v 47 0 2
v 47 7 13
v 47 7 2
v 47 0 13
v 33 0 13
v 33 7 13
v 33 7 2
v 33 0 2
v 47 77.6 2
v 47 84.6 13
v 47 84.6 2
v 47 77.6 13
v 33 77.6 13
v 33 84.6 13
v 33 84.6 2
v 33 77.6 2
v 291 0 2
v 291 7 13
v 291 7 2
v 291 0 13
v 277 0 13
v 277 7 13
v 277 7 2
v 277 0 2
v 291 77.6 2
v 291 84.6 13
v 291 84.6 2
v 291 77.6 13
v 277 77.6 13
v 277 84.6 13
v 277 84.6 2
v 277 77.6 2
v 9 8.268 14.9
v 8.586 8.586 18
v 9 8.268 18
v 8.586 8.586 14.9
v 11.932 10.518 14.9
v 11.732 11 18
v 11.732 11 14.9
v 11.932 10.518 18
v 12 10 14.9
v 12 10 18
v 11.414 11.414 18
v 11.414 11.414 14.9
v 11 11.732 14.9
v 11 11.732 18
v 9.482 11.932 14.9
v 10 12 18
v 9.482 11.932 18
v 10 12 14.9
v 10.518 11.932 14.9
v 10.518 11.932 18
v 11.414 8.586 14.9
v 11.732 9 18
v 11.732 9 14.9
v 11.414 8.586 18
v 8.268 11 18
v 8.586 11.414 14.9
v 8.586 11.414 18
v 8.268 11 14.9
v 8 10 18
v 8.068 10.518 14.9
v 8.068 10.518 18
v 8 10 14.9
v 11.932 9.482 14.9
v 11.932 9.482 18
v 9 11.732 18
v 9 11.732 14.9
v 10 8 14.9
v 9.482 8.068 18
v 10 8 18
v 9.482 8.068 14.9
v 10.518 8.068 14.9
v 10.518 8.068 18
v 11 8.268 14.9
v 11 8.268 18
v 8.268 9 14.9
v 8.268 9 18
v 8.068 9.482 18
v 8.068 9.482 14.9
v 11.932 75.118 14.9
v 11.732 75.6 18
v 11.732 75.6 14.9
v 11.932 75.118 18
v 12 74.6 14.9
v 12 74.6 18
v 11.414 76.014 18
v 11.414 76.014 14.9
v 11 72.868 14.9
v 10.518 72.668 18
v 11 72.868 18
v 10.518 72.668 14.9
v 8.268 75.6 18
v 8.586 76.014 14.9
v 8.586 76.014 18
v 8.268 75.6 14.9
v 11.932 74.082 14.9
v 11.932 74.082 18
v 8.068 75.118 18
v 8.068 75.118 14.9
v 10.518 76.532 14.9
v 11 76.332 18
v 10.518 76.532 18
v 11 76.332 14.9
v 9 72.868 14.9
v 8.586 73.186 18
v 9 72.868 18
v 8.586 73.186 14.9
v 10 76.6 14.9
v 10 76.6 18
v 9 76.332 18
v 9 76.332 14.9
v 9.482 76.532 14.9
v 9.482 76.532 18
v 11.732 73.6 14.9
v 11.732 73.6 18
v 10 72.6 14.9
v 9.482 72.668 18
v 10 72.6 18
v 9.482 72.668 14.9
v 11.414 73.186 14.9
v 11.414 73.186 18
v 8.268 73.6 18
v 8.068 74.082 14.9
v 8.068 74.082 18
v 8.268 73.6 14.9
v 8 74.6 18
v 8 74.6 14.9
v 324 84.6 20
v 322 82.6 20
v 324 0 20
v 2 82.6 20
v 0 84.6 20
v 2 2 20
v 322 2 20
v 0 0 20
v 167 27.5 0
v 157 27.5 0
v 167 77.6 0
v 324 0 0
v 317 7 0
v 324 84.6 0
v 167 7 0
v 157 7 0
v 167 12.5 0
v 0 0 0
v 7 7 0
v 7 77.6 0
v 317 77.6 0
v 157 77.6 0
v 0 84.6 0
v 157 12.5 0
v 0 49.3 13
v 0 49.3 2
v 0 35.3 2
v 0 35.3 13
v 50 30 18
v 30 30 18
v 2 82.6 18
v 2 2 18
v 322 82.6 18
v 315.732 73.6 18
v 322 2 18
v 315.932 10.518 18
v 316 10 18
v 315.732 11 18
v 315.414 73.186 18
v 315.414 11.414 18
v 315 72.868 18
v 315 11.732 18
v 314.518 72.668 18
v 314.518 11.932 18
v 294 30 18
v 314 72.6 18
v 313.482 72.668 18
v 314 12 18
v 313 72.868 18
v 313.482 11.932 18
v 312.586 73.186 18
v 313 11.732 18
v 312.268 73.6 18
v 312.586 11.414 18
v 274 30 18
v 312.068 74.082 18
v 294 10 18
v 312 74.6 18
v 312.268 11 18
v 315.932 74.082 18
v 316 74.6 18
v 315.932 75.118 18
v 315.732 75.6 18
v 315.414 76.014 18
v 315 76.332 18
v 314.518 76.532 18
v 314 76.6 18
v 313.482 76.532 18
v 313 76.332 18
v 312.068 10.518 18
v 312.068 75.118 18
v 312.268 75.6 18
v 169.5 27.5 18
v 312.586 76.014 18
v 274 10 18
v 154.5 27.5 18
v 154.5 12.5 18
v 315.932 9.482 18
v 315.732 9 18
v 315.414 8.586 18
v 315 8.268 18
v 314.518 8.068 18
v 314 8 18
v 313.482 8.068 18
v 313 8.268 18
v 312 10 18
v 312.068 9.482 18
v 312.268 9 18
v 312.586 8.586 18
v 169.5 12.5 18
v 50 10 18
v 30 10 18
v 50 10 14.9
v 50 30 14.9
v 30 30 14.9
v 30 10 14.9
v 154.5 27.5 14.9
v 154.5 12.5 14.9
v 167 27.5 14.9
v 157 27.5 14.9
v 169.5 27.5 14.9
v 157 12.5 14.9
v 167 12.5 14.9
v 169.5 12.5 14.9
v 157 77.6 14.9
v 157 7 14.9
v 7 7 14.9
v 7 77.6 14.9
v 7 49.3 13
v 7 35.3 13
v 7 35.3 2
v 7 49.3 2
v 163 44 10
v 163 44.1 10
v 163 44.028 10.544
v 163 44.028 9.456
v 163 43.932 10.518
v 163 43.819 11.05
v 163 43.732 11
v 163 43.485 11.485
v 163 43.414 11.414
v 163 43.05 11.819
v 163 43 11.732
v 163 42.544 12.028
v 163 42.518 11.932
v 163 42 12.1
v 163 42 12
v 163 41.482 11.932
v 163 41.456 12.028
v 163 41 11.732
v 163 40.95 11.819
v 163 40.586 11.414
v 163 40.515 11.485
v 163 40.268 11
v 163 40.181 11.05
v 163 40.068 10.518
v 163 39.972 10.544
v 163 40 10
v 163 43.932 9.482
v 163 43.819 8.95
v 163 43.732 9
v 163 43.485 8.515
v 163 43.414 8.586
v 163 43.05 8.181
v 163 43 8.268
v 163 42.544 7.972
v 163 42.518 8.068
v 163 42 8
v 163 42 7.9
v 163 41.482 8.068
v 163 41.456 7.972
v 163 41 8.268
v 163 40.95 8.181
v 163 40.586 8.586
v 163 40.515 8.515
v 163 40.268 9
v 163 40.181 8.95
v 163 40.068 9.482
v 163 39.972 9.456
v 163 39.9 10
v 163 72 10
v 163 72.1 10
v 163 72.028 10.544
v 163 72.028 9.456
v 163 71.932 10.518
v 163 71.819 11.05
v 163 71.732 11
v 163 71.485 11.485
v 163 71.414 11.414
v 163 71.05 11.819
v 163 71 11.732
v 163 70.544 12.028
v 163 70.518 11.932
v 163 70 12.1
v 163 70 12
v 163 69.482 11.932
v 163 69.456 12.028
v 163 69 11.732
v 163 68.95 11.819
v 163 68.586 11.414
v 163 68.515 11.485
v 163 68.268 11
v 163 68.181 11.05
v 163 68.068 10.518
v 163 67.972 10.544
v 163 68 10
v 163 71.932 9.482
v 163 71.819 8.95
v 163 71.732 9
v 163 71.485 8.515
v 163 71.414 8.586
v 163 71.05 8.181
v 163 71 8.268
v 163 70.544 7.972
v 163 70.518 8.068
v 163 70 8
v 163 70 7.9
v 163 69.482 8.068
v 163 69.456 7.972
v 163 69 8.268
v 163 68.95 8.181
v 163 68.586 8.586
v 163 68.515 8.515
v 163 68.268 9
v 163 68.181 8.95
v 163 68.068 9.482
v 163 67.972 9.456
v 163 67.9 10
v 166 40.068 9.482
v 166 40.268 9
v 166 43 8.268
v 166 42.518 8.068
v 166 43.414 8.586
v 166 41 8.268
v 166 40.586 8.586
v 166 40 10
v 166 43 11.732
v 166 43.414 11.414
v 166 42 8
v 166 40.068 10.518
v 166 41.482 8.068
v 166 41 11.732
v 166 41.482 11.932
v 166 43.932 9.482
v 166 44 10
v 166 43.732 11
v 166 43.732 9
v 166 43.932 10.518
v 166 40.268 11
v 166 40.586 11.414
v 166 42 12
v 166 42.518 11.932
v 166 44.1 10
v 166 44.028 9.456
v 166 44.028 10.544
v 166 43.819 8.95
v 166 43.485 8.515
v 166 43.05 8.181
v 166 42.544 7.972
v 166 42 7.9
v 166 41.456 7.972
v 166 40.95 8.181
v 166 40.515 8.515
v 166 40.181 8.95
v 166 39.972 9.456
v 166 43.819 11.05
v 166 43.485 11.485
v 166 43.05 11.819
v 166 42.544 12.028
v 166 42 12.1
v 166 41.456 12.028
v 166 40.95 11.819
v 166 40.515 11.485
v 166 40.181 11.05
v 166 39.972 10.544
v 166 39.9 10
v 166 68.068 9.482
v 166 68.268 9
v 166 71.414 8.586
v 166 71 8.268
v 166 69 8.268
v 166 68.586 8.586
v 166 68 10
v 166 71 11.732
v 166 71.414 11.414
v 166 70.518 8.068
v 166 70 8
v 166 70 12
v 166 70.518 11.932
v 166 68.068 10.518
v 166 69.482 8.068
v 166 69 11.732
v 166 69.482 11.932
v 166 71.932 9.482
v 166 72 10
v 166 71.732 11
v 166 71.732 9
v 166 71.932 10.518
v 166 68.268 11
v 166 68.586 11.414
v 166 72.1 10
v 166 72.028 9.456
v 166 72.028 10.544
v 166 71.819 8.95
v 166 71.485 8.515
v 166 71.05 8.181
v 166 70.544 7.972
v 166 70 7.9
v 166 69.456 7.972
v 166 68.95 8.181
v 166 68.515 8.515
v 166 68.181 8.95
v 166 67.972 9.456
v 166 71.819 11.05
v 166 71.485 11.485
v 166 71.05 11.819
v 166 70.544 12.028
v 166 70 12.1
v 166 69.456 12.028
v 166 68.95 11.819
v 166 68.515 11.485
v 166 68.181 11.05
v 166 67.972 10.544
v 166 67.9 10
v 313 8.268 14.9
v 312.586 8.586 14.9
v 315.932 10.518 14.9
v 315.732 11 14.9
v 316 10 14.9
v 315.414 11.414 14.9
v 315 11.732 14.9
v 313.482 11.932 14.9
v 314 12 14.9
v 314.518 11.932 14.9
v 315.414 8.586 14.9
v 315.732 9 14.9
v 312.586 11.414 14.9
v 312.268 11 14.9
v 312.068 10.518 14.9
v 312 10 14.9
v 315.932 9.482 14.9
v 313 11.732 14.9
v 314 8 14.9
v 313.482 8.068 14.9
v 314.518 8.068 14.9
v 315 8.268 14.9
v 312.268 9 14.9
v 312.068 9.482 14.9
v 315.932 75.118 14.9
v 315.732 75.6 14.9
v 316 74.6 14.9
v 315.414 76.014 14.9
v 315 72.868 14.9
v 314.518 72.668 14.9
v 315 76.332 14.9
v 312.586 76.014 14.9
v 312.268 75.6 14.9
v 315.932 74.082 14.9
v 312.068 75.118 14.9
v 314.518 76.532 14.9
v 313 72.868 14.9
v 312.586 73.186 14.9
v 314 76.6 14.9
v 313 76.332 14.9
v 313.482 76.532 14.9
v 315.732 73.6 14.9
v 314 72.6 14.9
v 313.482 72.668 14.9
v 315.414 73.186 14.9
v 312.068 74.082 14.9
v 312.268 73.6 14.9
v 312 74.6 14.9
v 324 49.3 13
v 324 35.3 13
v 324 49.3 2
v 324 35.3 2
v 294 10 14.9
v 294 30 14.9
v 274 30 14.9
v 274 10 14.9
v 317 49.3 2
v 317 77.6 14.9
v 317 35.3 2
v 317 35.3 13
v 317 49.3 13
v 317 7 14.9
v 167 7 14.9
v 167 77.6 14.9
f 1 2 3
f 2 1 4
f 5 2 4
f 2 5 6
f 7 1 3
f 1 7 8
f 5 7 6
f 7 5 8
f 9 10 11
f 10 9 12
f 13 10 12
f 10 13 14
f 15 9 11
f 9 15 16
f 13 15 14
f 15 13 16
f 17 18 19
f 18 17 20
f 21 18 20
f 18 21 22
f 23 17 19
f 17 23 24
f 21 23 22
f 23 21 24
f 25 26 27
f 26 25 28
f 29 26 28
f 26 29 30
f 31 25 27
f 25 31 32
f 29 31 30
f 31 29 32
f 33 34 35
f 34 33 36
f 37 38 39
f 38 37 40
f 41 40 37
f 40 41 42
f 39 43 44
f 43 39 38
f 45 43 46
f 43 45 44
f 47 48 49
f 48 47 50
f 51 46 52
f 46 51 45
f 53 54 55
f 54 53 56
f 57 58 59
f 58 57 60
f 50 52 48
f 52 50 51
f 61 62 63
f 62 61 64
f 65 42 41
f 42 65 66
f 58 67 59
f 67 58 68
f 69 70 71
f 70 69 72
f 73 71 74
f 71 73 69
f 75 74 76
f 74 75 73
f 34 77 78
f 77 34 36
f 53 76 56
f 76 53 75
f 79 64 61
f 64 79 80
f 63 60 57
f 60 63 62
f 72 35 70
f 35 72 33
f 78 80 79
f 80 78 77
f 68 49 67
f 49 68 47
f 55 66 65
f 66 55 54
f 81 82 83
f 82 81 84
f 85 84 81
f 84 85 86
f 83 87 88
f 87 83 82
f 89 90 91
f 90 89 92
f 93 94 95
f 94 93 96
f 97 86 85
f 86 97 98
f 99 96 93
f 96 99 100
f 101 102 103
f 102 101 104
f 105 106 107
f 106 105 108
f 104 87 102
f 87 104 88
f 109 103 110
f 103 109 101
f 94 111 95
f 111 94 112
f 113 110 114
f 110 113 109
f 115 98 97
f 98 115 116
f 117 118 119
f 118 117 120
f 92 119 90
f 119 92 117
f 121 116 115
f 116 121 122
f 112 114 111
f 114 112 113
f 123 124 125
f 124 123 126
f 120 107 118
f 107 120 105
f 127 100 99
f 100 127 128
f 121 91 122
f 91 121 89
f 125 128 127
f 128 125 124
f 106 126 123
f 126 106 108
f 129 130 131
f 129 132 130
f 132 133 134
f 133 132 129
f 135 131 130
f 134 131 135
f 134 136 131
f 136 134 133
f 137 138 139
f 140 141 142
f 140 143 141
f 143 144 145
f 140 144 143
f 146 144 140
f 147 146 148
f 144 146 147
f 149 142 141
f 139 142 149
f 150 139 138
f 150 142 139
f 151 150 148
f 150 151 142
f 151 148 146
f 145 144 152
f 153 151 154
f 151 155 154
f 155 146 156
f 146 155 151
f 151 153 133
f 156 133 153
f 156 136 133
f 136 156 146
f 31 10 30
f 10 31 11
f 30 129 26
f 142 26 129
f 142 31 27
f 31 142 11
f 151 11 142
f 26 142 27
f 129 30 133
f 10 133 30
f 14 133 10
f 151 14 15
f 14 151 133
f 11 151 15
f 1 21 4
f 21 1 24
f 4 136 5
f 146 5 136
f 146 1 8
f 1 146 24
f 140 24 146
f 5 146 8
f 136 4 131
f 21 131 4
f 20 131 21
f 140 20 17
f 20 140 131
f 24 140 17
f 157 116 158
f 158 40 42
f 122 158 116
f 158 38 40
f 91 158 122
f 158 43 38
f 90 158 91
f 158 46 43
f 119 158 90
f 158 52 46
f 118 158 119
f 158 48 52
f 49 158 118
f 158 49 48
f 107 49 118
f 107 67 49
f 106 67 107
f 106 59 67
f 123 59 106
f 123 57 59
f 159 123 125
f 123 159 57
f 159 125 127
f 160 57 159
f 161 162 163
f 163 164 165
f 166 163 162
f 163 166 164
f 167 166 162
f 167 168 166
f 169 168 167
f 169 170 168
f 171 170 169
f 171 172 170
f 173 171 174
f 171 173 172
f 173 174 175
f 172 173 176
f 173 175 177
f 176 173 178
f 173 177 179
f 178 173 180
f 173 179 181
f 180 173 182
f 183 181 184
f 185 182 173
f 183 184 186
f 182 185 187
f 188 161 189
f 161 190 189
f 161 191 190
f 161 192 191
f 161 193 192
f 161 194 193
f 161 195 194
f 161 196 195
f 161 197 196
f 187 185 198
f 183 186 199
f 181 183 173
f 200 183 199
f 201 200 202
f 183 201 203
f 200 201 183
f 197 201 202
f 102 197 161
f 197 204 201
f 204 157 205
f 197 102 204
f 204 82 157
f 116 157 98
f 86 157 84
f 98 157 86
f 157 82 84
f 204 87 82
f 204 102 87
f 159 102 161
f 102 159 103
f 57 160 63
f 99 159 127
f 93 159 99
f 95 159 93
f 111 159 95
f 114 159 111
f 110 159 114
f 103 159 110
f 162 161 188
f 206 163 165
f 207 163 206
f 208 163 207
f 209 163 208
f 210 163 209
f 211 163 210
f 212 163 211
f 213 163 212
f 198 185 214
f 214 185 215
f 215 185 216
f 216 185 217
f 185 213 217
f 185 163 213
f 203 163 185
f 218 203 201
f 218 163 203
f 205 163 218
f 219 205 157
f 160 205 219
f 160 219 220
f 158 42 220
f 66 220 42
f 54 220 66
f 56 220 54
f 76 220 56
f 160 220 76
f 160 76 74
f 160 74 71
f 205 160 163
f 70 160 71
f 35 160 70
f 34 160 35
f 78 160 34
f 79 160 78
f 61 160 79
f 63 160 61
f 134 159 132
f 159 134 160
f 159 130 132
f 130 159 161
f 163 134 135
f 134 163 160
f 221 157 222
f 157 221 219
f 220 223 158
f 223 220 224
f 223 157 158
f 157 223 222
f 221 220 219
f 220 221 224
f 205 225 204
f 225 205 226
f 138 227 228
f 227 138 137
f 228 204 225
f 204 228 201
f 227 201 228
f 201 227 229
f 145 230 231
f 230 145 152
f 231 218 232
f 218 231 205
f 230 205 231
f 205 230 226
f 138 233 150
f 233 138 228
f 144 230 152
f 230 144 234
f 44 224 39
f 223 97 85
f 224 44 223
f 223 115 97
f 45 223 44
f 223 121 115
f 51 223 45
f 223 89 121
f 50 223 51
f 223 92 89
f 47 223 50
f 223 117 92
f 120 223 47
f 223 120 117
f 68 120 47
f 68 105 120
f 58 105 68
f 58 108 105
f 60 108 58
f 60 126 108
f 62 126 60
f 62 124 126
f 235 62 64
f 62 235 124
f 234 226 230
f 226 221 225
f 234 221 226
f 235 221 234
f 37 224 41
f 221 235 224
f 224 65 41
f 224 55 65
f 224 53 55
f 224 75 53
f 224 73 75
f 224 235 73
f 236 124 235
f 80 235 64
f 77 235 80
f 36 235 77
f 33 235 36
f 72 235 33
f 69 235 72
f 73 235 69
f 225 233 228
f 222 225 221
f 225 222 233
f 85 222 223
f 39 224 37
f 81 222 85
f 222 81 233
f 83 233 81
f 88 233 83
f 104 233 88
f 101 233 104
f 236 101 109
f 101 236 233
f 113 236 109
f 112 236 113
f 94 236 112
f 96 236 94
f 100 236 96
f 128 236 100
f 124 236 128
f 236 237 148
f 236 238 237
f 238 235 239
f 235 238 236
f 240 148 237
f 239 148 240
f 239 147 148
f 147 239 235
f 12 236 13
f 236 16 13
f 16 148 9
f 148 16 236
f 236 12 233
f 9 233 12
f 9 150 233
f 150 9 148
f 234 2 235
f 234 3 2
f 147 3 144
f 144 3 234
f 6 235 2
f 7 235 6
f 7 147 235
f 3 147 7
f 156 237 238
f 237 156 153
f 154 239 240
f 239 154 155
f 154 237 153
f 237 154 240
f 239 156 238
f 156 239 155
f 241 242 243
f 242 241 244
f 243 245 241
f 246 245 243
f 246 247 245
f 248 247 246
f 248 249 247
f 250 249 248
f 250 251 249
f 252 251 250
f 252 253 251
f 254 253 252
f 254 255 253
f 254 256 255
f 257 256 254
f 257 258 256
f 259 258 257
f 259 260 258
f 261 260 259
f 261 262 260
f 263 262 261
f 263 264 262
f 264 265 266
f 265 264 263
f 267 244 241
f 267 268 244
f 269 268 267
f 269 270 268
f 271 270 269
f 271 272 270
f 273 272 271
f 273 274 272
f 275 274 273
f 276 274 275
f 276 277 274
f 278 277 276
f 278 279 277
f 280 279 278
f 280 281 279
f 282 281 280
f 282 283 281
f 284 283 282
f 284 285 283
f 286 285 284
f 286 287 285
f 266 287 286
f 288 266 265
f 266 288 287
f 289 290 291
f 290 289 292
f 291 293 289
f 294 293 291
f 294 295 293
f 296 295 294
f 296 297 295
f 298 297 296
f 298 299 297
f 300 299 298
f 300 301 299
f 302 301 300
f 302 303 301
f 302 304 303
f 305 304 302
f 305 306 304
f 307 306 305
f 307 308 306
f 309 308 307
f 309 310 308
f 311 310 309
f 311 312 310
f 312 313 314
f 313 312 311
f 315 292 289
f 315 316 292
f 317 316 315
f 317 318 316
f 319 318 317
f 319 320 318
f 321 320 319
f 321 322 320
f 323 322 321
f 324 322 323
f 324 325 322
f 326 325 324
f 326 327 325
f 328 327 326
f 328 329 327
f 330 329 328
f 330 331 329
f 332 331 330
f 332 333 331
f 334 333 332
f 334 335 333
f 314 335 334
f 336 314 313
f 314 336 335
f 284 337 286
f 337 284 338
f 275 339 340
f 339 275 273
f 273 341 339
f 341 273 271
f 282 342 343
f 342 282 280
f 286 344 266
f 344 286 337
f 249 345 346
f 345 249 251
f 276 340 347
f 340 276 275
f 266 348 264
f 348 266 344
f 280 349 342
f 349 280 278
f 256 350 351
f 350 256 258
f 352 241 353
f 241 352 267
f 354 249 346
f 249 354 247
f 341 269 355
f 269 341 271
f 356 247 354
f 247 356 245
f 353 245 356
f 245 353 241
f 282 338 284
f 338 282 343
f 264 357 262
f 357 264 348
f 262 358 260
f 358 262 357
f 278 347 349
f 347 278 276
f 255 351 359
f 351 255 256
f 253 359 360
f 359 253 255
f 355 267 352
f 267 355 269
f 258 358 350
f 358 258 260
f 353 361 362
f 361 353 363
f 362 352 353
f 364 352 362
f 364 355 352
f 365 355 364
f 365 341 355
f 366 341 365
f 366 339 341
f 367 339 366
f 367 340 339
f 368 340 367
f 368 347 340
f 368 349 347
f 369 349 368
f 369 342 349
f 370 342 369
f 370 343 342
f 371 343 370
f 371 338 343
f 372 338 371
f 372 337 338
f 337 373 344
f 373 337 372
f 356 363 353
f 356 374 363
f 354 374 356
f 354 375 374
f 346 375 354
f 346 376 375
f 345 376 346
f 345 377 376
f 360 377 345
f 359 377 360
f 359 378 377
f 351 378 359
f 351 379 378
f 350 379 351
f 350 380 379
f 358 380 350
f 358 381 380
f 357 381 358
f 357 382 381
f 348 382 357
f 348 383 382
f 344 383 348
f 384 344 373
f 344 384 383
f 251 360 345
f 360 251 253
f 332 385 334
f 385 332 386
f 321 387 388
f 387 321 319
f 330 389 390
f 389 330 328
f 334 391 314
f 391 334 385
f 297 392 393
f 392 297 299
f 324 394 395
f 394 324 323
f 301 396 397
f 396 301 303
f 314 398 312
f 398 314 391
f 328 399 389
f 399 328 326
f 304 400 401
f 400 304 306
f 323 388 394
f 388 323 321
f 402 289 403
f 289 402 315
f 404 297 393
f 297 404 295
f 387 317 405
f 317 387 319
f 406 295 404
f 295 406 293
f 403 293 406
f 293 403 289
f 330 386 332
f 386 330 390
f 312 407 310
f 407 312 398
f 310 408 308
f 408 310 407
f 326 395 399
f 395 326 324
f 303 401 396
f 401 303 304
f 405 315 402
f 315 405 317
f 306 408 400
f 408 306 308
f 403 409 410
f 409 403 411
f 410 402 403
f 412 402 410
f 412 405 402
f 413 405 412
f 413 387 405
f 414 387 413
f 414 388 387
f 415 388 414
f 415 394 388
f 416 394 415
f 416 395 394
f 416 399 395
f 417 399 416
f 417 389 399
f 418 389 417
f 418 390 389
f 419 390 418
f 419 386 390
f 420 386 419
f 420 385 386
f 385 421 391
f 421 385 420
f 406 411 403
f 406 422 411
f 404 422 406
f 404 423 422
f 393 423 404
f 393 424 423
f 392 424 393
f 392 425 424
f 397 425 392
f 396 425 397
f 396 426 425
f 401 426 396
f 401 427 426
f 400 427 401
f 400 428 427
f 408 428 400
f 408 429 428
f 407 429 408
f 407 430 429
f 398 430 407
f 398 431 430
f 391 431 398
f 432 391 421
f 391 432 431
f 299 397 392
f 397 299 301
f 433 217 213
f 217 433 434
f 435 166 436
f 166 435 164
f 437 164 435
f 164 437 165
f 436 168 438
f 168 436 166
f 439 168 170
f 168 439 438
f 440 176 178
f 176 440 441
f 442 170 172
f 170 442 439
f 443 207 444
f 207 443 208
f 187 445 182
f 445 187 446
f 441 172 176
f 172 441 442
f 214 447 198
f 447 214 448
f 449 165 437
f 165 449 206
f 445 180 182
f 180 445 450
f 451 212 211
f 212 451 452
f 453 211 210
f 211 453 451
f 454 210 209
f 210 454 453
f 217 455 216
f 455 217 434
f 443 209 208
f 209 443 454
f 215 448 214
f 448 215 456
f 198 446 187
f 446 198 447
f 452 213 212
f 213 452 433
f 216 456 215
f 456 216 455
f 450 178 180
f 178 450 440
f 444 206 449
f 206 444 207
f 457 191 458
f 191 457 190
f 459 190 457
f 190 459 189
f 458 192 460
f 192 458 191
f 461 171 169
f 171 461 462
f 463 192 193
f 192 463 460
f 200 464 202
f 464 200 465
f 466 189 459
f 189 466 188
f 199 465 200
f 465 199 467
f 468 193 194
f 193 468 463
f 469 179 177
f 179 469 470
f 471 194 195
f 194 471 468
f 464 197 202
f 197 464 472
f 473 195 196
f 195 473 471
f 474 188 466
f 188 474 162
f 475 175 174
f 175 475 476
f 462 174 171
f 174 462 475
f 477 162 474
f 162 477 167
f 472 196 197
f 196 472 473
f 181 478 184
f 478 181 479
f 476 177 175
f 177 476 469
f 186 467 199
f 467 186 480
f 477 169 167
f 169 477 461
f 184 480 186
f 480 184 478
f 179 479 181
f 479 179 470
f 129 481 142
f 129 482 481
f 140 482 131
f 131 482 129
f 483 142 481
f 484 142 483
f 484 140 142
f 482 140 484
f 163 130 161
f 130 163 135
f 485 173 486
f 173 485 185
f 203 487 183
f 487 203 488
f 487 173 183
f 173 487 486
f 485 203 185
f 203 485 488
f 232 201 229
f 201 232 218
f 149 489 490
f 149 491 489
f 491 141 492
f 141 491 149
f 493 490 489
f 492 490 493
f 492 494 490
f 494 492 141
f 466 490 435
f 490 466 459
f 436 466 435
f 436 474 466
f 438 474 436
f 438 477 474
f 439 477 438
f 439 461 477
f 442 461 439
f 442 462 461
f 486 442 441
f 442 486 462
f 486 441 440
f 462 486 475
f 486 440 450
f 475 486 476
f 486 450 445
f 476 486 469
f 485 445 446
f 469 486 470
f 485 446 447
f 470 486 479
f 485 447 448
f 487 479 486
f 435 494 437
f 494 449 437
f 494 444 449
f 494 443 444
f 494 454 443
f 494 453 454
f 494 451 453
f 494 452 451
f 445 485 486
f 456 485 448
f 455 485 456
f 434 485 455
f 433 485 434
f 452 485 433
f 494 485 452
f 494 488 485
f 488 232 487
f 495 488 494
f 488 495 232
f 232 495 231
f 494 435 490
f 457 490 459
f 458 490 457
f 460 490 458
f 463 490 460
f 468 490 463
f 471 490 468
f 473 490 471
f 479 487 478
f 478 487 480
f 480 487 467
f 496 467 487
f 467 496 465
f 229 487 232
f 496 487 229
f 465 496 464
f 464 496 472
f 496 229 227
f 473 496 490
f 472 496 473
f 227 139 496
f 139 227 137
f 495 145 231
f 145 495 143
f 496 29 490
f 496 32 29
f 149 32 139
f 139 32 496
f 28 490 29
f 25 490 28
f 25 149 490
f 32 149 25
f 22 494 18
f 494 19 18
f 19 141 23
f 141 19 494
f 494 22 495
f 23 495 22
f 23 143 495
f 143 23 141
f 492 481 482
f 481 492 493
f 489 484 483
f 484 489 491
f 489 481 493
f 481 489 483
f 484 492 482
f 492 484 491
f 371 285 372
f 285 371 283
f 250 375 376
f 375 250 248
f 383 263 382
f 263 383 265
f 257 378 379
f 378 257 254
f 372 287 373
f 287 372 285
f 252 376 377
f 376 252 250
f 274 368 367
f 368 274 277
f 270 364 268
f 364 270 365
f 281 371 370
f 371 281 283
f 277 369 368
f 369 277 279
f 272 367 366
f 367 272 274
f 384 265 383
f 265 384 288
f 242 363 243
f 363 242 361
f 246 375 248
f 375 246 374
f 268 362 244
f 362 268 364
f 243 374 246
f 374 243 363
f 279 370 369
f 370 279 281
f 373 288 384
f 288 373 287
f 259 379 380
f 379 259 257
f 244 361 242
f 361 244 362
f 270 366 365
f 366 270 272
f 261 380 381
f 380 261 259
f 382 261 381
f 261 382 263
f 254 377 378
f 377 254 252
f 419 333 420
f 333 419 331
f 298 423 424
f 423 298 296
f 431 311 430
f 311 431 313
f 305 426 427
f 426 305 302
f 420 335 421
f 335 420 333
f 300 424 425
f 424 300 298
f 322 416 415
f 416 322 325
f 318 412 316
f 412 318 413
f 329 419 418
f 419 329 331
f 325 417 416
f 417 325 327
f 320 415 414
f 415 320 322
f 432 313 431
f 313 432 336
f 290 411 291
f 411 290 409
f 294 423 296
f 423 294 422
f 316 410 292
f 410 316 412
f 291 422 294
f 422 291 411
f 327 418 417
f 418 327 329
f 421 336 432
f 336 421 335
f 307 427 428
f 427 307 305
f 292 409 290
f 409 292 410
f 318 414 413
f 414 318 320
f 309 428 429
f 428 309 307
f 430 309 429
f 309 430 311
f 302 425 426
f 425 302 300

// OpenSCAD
/*
 * 8x32 LED Panel Housing - SPLIT VERSION
 * For printers with < 324mm build volume
 * Splits 324mm housing into 2× 162mm pieces with alignment
 */

// Include or copy the base design parameters
panel_length = 320;
panel_width = 80.6;
panel_thickness = 1.5;
housing_length = panel_length + 4;
housing_width = panel_width + 4;
housing_depth = 20; // Increased from 16mm to 20mm for more wire space
wall_thickness = 2; // Restored to 2mm (was 7mm, causing missing wall)
led_channel_depth = 2;
led_channel_width = panel_width;
led_channel_length = panel_length;
// ADJUST THIS PARAMETER to change the square hole size
wire_hole_size = 20; 
wire_channel_width = 14; // Increased from 10mm to 14mm
wire_channel_depth = 11; // Deeper wire channels
mounting_hole_dia = 4;
mounting_hole_inset = 10;

// Split parameters
split_position = housing_length / 2;  // Split in middle
alignment_pin_dia = 4;
alignment_pin_depth = 4;
alignment_pin_tolerance = 0.2;

module half_housing(is_left_half = true) {
    difference() {
        union() {
            // Half of the main housing
            intersection() {
                // Full housing (matching main design)
                difference() {
                    cube([housing_length, housing_width, housing_depth]);
                    
                    // LED channel
                    translate([wall_thickness, wall_thickness, housing_depth - led_channel_depth])
                        cube([led_channel_length, led_channel_width, led_channel_depth + 0.1]);
                    
                    // ===== WIRE HOLES through LED panel surface =====
                    // Y position: 2cm (20mm) from bottom edge
                    wire_y_pos = 20;
                    
                    // Left hole - 4cm (40mm) from left edge
                    if (is_left_half) {
                        translate([40, wire_y_pos, -0.1])
                            translate([-wire_hole_size/2, -wire_hole_size/2, 0]) // Center the square
                            cube([wire_hole_size, wire_hole_size, housing_depth - led_channel_depth + 0.2]);
                    }
                    // Right hole - 4cm (40mm) from right edge
                    else {
                        translate([housing_length - 40, wire_y_pos, -0.1])
                            translate([-wire_hole_size/2, -wire_hole_size/2, 0])
                            cube([wire_hole_size, wire_hole_size, housing_depth - led_channel_depth + 0.2]);
                    }

                    // Center hole - 16cm (approx middle). Using exact center (162mm) to align with split.
                    // User requested to keep this at 15mm while others are 20mm
                    translate([housing_length / 2, wire_y_pos, -0.1])
                        translate([-15/2, -15/2, 0])
                        cube([15, 15, housing_depth - led_channel_depth + 0.2]);
                    
                    // Weight reduction
                    // Increased depth to leave only 5mm of material at the front
                    // Reduced border width: Offset 5mm (was 15mm) -> 7mm border
                    // SPLIT into two parts to create a solid rib at the center (to hold alignment pins)
                    
                    // Part 1 (Left side)
                    translate([wall_thickness + 5, wall_thickness + 5, -0.1])
                        cube([split_position - (wall_thickness + 5) - 5, // Stop 5mm before center
                              housing_width - 2*wall_thickness - 10,
                              housing_depth - 5]);
                              
                    // Part 2 (Right side)
                    translate([split_position + 5, wall_thickness + 5, -0.1]) // Start 5mm after center
                        cube([housing_length - split_position - 5 - (wall_thickness + 5),
                              housing_width - 2*wall_thickness - 10,
                              housing_depth - 5]);
                    
                    // ===== SIDE WIRE CHANNELS (N/S/E/W) =====
                    // Allow wires to pass between panels through the walls
                    // Extended to 25mm to cut through the solid border into the hollow center
                    // Moved to Z=2 to make them "holes" instead of "slots" (Solid bottom border)
                    
                    // North/South Channels (Top/Bottom walls)
                    // Removed center channel (housing_length/2) as requested
                    for (x_pos = [40, housing_length - 40]) {
                         // Bottom wall (South)
                         translate([x_pos - wire_channel_width/2, -0.1, 2])
                            cube([wire_channel_width, 25, wire_channel_depth]);
                         
                         // Top wall (North)
                         translate([x_pos - wire_channel_width/2, housing_width - 25, 2])
                            cube([wire_channel_width, 25.1, wire_channel_depth]);
                    }

                    // East/West Channels (Left/Right walls)
                    // Left wall (West)
                    translate([-0.1, housing_width/2 - wire_channel_width/2, 2])
                        cube([25, wire_channel_width, wire_channel_depth]);

                    // Right wall (East)
                    translate([housing_length - 25, housing_width/2 - wire_channel_width/2, 2])
                        cube([25.1, wire_channel_width, wire_channel_depth]);


                    // Mounting holes
                    if (is_left_half) {
                        translate([mounting_hole_inset, mounting_hole_inset, -0.1])
                            cylinder(h=housing_depth + 0.2, d=mounting_hole_dia, $fn=24);
                        translate([mounting_hole_inset, housing_width - mounting_hole_inset, -0.1])
                            cylinder(h=housing_depth + 0.2, d=mounting_hole_dia, $fn=24);
                    } else {
                        translate([housing_length - mounting_hole_inset, mounting_hole_inset, -0.1])
                            cylinder(h=housing_depth + 0.2, d=mounting_hole_dia, $fn=24);
                        translate([housing_length - mounting_hole_inset, housing_width - mounting_hole_inset, -0.1])
                            cylinder(h=housing_depth + 0.2, d=mounting_hole_dia, $fn=24);
                    }
                }
                
                // Cut to half
                if (is_left_half) {
                    cube([split_position + 1, housing_width, housing_depth]);
                } else {
                    translate([split_position - 1, 0, 0])
                        cube([housing_length - split_position + 1, housing_width, housing_depth]);
                }
            }
            
            // Add alignment pins (on left half)
            if (is_left_half) {
                // Pins stick out from the split face
                // Reverted to center (housing_depth/2) now that we have a solid rib
                translate([split_position, 42, housing_depth/2])
                    rotate([0, 90, 0])
                    cylinder(h=alignment_pin_depth, d=alignment_pin_dia, $fn=24);
                
                translate([split_position, 70, housing_depth/2])
                    rotate([0, 90, 0])
                    cylinder(h=alignment_pin_depth, d=alignment_pin_dia, $fn=24);
            }
        }
        
        // Add alignment holes (on right half)
        if (!is_left_half) {
            translate([split_position - 1, 42, housing_depth/2])
                rotate([0, 90, 0])
                cylinder(h=alignment_pin_depth + 1, 
                        d=alignment_pin_dia + alignment_pin_tolerance, 
                        $fn=24);
            
            translate([split_position - 1, 70, housing_depth/2])
                rotate([0, 90, 0])
                cylinder(h=alignment_pin_depth + 1, 
                        d=alignment_pin_dia + alignment_pin_tolerance, 
                        $fn=24);
        }
    }
}

// ========== RENDER ==========

// ========== RENDER ==========

// Render Mode:
// 0 = Left Half (for printing)
// 1 = Right Half (for printing)
// 2 = Full Assembly (for preview)
render_mode = 2; 

if (render_mode == 0) {
    half_housing(is_left_half = true);
} else if (render_mode == 1) {
    half_housing(is_left_half = false);
} else if (render_mode == 3) {
    // Stacked Batch (3x Left Half with 2mm gap) - Matches 'housing_all.stl'
    for (i = [0:2]) {
        translate([0, 0, i * 22]) // 20mm height + 2mm gap
        half_housing(is_left_half = true);
    }
} else {
    // Full Assembly (Default)
    // Render both halves in place to show the complete panel
    half_housing(is_left_half = true);
    half_housing(is_left_half = false);
}

/*
 * PRINTING INSTRUCTIONS:
 * 
 * METHOD 1: Edit this file
 * - For LEFT half: Set render_left = true; (line 119)
 * - For RIGHT half: Set render_left = false; (line 119)
 * - Press F5 in OpenSCAD, then export STL
 * 
 * METHOD 2: Command line override
 * - Left:  openscad -D 'render_left=true' -o 8x32_left.stl 8x32_housing_split.scad
 * - Right: openscad -D 'render_left=false' -o 8x32_right.stl 8x32_housing_split.scad
 * 
 * ASSEMBLY:
 * 1. Print both pieces
 * 2. Align using pins and join with CA glue
 * 3. Optional: Add M3 screw through split for extra strength
 */
